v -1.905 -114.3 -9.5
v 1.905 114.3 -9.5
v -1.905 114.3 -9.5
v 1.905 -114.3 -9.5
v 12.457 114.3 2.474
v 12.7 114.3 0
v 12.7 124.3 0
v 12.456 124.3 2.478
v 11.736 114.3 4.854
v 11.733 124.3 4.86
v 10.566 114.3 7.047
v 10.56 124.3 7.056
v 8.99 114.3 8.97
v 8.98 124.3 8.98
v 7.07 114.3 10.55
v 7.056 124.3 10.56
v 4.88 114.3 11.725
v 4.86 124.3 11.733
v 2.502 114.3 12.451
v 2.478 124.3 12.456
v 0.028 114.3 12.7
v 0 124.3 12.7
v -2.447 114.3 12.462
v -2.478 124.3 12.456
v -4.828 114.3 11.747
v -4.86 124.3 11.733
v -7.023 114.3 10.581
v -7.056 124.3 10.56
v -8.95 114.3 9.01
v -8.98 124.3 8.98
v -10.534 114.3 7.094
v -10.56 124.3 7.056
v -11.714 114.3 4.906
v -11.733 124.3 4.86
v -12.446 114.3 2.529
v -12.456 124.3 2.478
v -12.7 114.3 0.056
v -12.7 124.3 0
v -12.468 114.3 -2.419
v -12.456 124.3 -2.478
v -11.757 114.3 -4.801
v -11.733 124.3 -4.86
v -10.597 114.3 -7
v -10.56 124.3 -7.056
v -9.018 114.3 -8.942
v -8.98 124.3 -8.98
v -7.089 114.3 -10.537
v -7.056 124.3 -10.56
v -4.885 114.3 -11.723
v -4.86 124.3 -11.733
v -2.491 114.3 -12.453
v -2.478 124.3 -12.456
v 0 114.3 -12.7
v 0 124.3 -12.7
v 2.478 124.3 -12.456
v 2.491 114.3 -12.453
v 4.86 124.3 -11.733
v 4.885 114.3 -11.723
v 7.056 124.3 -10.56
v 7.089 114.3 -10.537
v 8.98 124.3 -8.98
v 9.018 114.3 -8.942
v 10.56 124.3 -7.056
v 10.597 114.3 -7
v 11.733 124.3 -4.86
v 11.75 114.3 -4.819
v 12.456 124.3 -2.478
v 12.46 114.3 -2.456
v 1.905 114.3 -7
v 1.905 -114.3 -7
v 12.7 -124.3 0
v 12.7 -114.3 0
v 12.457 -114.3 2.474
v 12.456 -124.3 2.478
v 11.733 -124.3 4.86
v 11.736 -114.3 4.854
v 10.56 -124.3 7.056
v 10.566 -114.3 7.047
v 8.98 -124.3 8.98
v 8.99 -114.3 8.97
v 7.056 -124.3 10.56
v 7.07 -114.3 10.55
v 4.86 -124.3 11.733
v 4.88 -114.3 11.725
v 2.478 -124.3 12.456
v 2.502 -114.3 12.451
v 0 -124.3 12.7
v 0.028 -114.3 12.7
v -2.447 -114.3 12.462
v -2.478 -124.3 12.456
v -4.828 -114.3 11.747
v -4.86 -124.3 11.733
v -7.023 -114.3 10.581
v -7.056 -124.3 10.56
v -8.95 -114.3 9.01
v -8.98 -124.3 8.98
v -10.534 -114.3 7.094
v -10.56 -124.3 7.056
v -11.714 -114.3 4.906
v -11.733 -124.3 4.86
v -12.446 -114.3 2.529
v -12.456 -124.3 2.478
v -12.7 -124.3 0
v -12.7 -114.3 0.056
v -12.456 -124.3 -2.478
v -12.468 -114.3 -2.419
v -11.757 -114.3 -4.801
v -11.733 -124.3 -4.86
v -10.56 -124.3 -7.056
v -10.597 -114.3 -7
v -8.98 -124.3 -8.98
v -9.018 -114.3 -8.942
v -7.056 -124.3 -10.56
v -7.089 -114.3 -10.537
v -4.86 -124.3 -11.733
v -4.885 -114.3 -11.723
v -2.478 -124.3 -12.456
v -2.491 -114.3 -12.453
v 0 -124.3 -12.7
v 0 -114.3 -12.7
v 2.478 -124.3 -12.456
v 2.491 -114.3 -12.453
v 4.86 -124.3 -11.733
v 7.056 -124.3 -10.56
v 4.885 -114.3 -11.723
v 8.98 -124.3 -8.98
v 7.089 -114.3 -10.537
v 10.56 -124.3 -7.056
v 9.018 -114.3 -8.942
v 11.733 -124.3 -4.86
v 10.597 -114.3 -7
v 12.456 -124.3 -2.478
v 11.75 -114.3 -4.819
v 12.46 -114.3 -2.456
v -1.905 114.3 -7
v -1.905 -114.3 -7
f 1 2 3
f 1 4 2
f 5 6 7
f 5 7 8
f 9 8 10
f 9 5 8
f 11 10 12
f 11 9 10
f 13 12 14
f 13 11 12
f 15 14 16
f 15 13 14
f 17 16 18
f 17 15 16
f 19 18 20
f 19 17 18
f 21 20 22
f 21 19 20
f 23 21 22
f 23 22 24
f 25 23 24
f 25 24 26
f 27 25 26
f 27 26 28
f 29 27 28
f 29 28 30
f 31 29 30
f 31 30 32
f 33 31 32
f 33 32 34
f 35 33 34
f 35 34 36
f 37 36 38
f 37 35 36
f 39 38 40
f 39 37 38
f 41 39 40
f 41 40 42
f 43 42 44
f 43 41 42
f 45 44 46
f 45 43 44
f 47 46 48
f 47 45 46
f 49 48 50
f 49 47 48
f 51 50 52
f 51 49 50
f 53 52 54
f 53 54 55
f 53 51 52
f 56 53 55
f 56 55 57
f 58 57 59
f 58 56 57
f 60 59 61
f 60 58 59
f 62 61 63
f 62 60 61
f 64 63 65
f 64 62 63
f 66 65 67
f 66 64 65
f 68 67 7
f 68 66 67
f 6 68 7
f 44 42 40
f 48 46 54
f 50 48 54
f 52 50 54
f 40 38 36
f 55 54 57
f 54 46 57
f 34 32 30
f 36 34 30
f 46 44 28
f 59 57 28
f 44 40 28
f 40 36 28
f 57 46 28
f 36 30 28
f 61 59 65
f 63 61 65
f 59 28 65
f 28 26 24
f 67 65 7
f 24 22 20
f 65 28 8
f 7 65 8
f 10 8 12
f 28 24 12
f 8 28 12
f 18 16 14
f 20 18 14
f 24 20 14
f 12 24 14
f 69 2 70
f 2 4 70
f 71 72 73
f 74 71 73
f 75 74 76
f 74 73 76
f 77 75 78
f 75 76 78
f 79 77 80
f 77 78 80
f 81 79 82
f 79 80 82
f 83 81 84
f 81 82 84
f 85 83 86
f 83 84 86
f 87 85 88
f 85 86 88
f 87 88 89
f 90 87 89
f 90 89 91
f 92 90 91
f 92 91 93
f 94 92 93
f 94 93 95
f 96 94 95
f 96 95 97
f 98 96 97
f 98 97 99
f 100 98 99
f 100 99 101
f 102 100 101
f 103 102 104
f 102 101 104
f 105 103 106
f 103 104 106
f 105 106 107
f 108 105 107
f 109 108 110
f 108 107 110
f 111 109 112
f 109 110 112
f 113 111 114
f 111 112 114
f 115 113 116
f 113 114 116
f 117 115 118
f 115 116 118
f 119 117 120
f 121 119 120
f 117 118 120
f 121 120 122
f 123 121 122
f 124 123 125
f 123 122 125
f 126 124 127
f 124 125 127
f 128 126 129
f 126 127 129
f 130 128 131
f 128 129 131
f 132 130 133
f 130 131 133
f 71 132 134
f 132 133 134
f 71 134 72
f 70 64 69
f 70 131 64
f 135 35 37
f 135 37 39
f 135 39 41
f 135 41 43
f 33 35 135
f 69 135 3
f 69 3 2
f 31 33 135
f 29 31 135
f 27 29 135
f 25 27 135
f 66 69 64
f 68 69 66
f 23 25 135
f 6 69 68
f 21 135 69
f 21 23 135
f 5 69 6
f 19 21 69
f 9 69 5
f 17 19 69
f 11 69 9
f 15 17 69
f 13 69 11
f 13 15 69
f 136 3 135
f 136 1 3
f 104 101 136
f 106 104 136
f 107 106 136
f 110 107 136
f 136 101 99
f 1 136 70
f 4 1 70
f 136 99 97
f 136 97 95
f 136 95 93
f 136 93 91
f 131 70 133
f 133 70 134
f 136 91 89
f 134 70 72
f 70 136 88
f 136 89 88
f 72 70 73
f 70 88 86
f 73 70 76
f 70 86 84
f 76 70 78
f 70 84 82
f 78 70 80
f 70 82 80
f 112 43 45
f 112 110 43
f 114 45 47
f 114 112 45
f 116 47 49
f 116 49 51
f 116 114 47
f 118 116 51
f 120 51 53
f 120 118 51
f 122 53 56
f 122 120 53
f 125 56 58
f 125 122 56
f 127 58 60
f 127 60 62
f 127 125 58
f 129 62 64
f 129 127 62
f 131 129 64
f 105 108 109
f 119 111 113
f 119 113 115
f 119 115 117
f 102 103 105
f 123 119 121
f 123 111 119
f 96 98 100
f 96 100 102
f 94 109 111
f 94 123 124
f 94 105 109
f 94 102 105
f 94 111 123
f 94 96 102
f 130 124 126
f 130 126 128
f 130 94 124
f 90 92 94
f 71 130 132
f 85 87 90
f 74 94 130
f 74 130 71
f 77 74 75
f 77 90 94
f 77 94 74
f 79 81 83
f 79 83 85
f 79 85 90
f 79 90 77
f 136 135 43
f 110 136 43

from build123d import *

# Parameters (mm, degrees)
F1_DEPTH = 114.3
F2_R     = 12.7
F3_DEPTH = 10
F4_W     = 3.81
F4_H     = 2.5
F5_DEPTH = 114.3


with BuildPart() as f1:
    # F0 (on Front) → F1 (new body)
    with BuildSketch(Plane.XZ):
        with BuildLine():
            Line((10.596698, -7), (-10.596698, -7))
            ThreePointArc((-10.596698, -7), (0, -12.7), (10.596698, -7))
        make_face()
    extrude(amount=F1_DEPTH)

    # F2 (on face) → F3 (join)
    with BuildSketch(Plane.XZ.offset(114.3)):
        Circle(F2_R)
    extrude(amount=F3_DEPTH)

    # F4 (on face) → F5 (cut)
    with BuildSketch(Plane(origin=(0, 0, 0), x_dir=(-1, 0, 0), z_dir=(0, 1, 0))):
        with Locations((0, -8.25)):
            Rectangle(F4_W, F4_H)
    extrude(amount=-F5_DEPTH, mode=Mode.SUBTRACT)

    # F6: F1 across face


with BuildPart() as f1_1:
    add(f1.part)
    add(f1.part.mirror(Plane(origin=(0, 0, -9.466797), x_dir=(1, 0, 0), z_dir=(0, 1, 0))))


solid = f1_1.part
